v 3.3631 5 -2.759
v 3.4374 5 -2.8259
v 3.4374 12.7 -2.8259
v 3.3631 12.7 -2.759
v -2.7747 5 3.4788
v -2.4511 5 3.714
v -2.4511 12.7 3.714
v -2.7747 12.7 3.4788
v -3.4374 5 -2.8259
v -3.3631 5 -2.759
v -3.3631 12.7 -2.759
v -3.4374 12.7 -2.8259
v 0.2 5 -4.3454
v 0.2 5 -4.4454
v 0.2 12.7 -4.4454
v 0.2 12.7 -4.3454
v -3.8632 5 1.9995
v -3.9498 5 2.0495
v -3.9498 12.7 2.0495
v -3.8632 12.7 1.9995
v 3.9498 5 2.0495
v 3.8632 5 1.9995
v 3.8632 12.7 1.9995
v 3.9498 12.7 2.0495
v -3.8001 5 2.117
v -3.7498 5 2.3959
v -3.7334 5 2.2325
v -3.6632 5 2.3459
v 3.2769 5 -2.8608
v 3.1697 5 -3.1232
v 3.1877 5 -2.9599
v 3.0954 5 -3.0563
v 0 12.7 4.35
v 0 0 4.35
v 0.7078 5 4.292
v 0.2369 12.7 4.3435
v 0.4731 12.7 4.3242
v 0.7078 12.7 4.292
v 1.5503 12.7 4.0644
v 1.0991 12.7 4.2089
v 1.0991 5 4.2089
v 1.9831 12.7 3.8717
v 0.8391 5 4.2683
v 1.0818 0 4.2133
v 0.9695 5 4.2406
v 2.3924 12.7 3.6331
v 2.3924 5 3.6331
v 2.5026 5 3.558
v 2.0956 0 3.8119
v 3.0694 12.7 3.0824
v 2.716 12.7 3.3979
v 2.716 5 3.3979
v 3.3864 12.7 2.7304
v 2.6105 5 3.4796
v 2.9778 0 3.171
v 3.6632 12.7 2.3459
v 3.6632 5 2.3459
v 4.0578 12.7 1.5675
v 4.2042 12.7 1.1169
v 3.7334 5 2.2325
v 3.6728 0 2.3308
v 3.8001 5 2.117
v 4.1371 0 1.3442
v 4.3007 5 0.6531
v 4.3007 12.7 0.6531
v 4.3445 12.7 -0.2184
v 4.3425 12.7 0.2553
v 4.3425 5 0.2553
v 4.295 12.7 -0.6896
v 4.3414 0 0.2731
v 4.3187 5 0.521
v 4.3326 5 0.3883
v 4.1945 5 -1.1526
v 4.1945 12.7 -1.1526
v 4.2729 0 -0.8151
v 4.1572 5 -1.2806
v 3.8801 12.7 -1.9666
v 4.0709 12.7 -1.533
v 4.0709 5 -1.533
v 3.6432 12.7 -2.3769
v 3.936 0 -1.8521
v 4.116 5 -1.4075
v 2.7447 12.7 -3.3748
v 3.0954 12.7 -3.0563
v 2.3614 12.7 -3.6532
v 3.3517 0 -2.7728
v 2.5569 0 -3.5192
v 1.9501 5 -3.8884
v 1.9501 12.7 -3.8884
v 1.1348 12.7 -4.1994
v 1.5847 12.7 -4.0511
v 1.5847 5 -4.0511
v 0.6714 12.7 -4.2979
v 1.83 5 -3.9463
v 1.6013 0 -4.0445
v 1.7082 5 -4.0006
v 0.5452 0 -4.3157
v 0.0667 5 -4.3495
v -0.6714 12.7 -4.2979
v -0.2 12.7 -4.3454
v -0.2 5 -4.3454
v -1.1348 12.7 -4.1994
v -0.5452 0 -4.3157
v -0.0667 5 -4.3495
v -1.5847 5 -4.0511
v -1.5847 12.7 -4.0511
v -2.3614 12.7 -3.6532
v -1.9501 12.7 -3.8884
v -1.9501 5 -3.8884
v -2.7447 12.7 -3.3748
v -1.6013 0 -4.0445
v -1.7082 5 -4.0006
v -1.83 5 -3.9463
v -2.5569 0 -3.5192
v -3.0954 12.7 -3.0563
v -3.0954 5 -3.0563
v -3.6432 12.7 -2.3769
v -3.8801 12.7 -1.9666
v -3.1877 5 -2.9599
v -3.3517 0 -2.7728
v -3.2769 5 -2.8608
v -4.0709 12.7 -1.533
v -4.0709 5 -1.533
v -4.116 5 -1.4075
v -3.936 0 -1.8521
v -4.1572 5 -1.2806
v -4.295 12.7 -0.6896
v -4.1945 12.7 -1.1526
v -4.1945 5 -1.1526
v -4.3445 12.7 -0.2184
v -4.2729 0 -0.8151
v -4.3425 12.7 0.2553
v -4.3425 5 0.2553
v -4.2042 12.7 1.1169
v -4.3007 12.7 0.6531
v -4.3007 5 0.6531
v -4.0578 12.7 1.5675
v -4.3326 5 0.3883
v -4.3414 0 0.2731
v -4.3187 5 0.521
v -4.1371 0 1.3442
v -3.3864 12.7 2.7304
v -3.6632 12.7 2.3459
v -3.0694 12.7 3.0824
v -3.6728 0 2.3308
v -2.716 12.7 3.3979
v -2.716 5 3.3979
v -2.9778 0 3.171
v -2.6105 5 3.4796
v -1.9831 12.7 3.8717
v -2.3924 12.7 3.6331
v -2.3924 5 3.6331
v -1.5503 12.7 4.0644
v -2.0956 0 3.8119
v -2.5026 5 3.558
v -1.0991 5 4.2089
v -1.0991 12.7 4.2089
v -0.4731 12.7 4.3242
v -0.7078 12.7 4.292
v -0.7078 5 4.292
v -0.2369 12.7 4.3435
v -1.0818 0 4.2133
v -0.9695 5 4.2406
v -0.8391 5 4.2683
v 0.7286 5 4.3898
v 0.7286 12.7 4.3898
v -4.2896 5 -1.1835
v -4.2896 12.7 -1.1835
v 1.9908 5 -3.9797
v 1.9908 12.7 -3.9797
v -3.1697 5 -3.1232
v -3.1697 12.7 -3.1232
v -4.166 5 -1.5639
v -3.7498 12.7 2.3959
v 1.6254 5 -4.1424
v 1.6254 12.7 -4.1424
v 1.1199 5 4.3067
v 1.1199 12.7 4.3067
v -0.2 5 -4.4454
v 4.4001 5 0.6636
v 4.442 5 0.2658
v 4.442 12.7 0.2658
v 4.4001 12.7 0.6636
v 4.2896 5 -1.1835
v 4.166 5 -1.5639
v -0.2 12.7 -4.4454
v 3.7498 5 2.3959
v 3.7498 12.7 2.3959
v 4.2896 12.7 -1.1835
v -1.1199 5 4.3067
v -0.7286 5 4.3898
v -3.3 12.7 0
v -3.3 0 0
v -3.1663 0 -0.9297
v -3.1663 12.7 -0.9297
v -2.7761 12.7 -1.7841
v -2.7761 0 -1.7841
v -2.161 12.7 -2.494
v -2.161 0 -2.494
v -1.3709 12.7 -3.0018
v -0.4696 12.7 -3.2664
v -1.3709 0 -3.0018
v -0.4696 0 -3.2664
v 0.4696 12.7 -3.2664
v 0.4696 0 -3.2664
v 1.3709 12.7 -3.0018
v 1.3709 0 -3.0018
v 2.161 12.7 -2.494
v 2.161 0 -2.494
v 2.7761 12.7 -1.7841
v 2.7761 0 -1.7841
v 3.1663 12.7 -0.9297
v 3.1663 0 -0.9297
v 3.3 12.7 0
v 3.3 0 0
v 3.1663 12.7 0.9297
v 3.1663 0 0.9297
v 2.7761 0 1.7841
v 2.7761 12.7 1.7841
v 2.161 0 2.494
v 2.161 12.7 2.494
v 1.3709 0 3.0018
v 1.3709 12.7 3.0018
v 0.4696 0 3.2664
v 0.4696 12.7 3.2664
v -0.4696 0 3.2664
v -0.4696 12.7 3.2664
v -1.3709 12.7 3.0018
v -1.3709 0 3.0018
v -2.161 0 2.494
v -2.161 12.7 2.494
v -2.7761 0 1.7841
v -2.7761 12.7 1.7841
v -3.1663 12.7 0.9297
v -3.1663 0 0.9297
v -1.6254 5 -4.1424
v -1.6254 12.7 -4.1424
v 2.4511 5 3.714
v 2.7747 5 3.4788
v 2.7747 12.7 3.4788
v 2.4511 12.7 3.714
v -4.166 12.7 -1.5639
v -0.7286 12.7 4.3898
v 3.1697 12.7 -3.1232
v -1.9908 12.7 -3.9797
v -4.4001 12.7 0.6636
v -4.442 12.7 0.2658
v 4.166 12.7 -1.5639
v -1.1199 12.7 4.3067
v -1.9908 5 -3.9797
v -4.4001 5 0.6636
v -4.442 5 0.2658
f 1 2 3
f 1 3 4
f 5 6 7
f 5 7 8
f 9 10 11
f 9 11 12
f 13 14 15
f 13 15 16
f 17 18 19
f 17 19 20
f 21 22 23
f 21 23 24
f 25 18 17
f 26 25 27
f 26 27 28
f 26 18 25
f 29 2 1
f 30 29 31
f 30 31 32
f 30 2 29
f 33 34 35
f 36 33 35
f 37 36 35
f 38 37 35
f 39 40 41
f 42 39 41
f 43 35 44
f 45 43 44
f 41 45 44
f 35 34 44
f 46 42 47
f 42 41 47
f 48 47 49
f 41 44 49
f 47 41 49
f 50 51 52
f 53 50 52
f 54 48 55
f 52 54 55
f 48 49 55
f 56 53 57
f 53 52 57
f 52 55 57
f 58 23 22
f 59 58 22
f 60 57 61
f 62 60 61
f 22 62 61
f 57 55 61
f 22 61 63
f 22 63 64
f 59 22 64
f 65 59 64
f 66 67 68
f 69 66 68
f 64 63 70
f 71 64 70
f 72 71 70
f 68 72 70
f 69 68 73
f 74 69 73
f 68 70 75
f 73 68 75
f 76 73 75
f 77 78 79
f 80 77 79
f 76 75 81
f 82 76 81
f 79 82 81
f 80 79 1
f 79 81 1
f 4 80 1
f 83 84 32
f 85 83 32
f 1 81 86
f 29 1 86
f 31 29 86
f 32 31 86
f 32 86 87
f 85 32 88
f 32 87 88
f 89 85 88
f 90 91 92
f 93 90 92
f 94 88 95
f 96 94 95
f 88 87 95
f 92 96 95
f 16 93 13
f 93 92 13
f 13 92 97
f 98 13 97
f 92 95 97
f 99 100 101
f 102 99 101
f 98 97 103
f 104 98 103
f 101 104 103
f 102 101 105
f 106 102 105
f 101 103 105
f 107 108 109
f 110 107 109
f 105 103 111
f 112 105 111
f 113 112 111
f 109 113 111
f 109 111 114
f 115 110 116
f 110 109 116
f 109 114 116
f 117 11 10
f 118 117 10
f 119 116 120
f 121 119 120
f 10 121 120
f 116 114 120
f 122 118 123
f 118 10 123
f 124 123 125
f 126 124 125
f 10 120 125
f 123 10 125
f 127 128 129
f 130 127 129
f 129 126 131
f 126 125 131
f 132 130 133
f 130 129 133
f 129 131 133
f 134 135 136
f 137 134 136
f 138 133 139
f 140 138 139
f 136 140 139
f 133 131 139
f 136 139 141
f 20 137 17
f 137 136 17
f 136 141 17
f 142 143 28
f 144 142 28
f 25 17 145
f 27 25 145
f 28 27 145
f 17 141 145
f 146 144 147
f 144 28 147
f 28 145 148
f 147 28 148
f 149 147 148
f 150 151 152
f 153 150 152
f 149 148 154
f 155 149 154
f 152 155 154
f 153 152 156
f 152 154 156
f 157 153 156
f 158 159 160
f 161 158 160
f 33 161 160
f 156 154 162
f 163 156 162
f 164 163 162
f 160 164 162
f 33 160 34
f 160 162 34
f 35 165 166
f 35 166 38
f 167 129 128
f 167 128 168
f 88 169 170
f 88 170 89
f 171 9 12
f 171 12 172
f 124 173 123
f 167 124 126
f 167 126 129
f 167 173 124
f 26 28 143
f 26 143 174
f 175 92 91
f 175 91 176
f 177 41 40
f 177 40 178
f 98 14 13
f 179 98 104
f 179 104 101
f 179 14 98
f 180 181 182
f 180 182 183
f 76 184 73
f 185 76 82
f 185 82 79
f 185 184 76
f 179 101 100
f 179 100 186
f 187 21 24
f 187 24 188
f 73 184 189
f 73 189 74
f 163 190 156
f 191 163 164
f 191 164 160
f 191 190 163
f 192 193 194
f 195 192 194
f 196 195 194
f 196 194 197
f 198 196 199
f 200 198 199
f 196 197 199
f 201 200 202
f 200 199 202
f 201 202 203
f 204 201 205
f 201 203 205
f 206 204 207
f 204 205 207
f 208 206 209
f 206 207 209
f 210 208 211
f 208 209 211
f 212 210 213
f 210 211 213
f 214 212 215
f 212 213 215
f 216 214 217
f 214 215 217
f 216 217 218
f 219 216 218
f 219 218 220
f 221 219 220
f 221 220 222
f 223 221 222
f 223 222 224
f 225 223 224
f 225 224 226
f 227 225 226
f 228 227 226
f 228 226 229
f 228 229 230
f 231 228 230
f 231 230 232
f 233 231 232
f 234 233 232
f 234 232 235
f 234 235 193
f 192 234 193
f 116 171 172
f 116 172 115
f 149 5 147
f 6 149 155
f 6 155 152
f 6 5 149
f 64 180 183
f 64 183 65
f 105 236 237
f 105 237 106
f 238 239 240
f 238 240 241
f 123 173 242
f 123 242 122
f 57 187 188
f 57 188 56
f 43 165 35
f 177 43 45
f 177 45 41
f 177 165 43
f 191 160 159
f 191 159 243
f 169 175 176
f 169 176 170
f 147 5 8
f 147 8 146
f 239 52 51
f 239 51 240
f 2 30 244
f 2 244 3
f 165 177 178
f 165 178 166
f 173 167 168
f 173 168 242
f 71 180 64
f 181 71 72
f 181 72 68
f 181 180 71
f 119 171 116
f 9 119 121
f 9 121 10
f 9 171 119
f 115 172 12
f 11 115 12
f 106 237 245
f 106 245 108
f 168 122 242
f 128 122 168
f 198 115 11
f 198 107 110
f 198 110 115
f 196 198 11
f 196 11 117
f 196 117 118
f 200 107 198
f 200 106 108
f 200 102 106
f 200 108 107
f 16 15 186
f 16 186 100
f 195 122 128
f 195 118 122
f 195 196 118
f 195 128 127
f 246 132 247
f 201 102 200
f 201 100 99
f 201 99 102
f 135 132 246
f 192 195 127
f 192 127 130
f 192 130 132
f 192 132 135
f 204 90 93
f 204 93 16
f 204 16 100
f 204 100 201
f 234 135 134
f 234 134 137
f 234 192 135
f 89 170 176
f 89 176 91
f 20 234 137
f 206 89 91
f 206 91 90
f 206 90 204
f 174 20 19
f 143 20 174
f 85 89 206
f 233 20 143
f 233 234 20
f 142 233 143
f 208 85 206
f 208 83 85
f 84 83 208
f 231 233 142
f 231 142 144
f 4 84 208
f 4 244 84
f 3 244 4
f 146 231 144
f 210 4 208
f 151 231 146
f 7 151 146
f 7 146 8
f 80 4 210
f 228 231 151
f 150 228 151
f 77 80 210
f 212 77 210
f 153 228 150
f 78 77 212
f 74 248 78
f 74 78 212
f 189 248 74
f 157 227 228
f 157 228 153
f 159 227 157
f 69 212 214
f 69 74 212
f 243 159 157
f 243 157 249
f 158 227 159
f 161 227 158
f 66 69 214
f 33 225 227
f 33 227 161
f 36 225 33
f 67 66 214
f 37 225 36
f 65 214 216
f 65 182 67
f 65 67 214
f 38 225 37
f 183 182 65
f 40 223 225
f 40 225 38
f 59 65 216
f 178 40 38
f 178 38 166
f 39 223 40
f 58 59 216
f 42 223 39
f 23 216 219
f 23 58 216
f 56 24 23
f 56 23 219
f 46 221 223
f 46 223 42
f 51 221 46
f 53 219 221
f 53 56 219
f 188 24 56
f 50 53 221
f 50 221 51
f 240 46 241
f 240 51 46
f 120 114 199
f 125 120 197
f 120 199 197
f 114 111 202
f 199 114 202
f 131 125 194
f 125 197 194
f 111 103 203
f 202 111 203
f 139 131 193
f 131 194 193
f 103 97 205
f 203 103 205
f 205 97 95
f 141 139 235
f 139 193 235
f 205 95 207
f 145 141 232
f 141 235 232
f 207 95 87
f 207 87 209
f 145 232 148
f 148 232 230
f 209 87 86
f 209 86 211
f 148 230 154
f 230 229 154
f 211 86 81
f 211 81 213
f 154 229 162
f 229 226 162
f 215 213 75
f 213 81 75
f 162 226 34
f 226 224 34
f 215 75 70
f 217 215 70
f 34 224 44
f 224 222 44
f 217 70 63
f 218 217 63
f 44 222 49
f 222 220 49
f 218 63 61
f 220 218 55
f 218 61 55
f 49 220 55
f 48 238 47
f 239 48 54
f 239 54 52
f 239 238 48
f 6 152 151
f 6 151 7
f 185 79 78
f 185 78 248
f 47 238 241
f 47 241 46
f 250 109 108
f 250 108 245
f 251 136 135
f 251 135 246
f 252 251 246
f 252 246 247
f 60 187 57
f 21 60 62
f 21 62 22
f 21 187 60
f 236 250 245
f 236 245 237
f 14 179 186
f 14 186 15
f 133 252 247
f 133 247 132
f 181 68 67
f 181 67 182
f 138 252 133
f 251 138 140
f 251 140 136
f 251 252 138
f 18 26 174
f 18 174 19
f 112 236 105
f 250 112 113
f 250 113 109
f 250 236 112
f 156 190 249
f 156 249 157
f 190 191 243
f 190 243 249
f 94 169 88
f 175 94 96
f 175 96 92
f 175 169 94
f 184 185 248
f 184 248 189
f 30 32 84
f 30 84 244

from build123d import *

# Parameters (mm, degrees)
SKETCH1_R            = 4.35
BODY_DEPTH           = 12.7
TEETH_START          = -7.7
TEETH_DEPTH          = 7.7
CIRPATTERN1_COUNT    = 15
M6_CLEARANCE_HOLE1_D = 6.6


with BuildPart() as part:
    # Sketch1 → Body (new body)
    with BuildSketch(Plane(origin=(0, 0, 0), x_dir=(1, 0, 0), z_dir=(0, 1, 0))):
        with Locations(Location((0, 0, 0), (0, 0, 270))):
            Circle(SKETCH1_R)
    extrude(amount=BODY_DEPTH)

    # Sketch2 → Teeth (add)
    with BuildSketch(Plane(origin=(0, 12.7, 0), x_dir=(1, 0, 0), z_dir=(0, 1, 0)).offset(TEETH_START)):
        with BuildLine():
            Line((-0.2, 4.345399867), (-0.2, 4.445399867))
            Line((-0.2, 4.445399867), (0.2, 4.445399867))
            Line((0.2, 4.445399867), (0.2, 4.345399867))
            ThreePointArc((0.2, 4.345399867), (0, 4.35), (-0.2, 4.345399867))
        make_face()
    teeth = extrude(amount=TEETH_DEPTH)

    # CirPattern1: Teeth ×15 about axis
    cirpattern1_axis = Axis((0, 0, 0), (0, 1, 0))
    for i in range(1, CIRPATTERN1_COUNT):
        add(teeth.rotate(cirpattern1_axis, i * 360 / CIRPATTERN1_COUNT))

    # M6 Clearance Hole1 (through all)
    with Locations(Plane(origin=(0, 12.7, 0), x_dir=(1, 0, 0), z_dir=(0, 1, 0))):
        with Locations((0, 0)):
            Hole(M6_CLEARANCE_HOLE1_D / 2)


solid = part.part
